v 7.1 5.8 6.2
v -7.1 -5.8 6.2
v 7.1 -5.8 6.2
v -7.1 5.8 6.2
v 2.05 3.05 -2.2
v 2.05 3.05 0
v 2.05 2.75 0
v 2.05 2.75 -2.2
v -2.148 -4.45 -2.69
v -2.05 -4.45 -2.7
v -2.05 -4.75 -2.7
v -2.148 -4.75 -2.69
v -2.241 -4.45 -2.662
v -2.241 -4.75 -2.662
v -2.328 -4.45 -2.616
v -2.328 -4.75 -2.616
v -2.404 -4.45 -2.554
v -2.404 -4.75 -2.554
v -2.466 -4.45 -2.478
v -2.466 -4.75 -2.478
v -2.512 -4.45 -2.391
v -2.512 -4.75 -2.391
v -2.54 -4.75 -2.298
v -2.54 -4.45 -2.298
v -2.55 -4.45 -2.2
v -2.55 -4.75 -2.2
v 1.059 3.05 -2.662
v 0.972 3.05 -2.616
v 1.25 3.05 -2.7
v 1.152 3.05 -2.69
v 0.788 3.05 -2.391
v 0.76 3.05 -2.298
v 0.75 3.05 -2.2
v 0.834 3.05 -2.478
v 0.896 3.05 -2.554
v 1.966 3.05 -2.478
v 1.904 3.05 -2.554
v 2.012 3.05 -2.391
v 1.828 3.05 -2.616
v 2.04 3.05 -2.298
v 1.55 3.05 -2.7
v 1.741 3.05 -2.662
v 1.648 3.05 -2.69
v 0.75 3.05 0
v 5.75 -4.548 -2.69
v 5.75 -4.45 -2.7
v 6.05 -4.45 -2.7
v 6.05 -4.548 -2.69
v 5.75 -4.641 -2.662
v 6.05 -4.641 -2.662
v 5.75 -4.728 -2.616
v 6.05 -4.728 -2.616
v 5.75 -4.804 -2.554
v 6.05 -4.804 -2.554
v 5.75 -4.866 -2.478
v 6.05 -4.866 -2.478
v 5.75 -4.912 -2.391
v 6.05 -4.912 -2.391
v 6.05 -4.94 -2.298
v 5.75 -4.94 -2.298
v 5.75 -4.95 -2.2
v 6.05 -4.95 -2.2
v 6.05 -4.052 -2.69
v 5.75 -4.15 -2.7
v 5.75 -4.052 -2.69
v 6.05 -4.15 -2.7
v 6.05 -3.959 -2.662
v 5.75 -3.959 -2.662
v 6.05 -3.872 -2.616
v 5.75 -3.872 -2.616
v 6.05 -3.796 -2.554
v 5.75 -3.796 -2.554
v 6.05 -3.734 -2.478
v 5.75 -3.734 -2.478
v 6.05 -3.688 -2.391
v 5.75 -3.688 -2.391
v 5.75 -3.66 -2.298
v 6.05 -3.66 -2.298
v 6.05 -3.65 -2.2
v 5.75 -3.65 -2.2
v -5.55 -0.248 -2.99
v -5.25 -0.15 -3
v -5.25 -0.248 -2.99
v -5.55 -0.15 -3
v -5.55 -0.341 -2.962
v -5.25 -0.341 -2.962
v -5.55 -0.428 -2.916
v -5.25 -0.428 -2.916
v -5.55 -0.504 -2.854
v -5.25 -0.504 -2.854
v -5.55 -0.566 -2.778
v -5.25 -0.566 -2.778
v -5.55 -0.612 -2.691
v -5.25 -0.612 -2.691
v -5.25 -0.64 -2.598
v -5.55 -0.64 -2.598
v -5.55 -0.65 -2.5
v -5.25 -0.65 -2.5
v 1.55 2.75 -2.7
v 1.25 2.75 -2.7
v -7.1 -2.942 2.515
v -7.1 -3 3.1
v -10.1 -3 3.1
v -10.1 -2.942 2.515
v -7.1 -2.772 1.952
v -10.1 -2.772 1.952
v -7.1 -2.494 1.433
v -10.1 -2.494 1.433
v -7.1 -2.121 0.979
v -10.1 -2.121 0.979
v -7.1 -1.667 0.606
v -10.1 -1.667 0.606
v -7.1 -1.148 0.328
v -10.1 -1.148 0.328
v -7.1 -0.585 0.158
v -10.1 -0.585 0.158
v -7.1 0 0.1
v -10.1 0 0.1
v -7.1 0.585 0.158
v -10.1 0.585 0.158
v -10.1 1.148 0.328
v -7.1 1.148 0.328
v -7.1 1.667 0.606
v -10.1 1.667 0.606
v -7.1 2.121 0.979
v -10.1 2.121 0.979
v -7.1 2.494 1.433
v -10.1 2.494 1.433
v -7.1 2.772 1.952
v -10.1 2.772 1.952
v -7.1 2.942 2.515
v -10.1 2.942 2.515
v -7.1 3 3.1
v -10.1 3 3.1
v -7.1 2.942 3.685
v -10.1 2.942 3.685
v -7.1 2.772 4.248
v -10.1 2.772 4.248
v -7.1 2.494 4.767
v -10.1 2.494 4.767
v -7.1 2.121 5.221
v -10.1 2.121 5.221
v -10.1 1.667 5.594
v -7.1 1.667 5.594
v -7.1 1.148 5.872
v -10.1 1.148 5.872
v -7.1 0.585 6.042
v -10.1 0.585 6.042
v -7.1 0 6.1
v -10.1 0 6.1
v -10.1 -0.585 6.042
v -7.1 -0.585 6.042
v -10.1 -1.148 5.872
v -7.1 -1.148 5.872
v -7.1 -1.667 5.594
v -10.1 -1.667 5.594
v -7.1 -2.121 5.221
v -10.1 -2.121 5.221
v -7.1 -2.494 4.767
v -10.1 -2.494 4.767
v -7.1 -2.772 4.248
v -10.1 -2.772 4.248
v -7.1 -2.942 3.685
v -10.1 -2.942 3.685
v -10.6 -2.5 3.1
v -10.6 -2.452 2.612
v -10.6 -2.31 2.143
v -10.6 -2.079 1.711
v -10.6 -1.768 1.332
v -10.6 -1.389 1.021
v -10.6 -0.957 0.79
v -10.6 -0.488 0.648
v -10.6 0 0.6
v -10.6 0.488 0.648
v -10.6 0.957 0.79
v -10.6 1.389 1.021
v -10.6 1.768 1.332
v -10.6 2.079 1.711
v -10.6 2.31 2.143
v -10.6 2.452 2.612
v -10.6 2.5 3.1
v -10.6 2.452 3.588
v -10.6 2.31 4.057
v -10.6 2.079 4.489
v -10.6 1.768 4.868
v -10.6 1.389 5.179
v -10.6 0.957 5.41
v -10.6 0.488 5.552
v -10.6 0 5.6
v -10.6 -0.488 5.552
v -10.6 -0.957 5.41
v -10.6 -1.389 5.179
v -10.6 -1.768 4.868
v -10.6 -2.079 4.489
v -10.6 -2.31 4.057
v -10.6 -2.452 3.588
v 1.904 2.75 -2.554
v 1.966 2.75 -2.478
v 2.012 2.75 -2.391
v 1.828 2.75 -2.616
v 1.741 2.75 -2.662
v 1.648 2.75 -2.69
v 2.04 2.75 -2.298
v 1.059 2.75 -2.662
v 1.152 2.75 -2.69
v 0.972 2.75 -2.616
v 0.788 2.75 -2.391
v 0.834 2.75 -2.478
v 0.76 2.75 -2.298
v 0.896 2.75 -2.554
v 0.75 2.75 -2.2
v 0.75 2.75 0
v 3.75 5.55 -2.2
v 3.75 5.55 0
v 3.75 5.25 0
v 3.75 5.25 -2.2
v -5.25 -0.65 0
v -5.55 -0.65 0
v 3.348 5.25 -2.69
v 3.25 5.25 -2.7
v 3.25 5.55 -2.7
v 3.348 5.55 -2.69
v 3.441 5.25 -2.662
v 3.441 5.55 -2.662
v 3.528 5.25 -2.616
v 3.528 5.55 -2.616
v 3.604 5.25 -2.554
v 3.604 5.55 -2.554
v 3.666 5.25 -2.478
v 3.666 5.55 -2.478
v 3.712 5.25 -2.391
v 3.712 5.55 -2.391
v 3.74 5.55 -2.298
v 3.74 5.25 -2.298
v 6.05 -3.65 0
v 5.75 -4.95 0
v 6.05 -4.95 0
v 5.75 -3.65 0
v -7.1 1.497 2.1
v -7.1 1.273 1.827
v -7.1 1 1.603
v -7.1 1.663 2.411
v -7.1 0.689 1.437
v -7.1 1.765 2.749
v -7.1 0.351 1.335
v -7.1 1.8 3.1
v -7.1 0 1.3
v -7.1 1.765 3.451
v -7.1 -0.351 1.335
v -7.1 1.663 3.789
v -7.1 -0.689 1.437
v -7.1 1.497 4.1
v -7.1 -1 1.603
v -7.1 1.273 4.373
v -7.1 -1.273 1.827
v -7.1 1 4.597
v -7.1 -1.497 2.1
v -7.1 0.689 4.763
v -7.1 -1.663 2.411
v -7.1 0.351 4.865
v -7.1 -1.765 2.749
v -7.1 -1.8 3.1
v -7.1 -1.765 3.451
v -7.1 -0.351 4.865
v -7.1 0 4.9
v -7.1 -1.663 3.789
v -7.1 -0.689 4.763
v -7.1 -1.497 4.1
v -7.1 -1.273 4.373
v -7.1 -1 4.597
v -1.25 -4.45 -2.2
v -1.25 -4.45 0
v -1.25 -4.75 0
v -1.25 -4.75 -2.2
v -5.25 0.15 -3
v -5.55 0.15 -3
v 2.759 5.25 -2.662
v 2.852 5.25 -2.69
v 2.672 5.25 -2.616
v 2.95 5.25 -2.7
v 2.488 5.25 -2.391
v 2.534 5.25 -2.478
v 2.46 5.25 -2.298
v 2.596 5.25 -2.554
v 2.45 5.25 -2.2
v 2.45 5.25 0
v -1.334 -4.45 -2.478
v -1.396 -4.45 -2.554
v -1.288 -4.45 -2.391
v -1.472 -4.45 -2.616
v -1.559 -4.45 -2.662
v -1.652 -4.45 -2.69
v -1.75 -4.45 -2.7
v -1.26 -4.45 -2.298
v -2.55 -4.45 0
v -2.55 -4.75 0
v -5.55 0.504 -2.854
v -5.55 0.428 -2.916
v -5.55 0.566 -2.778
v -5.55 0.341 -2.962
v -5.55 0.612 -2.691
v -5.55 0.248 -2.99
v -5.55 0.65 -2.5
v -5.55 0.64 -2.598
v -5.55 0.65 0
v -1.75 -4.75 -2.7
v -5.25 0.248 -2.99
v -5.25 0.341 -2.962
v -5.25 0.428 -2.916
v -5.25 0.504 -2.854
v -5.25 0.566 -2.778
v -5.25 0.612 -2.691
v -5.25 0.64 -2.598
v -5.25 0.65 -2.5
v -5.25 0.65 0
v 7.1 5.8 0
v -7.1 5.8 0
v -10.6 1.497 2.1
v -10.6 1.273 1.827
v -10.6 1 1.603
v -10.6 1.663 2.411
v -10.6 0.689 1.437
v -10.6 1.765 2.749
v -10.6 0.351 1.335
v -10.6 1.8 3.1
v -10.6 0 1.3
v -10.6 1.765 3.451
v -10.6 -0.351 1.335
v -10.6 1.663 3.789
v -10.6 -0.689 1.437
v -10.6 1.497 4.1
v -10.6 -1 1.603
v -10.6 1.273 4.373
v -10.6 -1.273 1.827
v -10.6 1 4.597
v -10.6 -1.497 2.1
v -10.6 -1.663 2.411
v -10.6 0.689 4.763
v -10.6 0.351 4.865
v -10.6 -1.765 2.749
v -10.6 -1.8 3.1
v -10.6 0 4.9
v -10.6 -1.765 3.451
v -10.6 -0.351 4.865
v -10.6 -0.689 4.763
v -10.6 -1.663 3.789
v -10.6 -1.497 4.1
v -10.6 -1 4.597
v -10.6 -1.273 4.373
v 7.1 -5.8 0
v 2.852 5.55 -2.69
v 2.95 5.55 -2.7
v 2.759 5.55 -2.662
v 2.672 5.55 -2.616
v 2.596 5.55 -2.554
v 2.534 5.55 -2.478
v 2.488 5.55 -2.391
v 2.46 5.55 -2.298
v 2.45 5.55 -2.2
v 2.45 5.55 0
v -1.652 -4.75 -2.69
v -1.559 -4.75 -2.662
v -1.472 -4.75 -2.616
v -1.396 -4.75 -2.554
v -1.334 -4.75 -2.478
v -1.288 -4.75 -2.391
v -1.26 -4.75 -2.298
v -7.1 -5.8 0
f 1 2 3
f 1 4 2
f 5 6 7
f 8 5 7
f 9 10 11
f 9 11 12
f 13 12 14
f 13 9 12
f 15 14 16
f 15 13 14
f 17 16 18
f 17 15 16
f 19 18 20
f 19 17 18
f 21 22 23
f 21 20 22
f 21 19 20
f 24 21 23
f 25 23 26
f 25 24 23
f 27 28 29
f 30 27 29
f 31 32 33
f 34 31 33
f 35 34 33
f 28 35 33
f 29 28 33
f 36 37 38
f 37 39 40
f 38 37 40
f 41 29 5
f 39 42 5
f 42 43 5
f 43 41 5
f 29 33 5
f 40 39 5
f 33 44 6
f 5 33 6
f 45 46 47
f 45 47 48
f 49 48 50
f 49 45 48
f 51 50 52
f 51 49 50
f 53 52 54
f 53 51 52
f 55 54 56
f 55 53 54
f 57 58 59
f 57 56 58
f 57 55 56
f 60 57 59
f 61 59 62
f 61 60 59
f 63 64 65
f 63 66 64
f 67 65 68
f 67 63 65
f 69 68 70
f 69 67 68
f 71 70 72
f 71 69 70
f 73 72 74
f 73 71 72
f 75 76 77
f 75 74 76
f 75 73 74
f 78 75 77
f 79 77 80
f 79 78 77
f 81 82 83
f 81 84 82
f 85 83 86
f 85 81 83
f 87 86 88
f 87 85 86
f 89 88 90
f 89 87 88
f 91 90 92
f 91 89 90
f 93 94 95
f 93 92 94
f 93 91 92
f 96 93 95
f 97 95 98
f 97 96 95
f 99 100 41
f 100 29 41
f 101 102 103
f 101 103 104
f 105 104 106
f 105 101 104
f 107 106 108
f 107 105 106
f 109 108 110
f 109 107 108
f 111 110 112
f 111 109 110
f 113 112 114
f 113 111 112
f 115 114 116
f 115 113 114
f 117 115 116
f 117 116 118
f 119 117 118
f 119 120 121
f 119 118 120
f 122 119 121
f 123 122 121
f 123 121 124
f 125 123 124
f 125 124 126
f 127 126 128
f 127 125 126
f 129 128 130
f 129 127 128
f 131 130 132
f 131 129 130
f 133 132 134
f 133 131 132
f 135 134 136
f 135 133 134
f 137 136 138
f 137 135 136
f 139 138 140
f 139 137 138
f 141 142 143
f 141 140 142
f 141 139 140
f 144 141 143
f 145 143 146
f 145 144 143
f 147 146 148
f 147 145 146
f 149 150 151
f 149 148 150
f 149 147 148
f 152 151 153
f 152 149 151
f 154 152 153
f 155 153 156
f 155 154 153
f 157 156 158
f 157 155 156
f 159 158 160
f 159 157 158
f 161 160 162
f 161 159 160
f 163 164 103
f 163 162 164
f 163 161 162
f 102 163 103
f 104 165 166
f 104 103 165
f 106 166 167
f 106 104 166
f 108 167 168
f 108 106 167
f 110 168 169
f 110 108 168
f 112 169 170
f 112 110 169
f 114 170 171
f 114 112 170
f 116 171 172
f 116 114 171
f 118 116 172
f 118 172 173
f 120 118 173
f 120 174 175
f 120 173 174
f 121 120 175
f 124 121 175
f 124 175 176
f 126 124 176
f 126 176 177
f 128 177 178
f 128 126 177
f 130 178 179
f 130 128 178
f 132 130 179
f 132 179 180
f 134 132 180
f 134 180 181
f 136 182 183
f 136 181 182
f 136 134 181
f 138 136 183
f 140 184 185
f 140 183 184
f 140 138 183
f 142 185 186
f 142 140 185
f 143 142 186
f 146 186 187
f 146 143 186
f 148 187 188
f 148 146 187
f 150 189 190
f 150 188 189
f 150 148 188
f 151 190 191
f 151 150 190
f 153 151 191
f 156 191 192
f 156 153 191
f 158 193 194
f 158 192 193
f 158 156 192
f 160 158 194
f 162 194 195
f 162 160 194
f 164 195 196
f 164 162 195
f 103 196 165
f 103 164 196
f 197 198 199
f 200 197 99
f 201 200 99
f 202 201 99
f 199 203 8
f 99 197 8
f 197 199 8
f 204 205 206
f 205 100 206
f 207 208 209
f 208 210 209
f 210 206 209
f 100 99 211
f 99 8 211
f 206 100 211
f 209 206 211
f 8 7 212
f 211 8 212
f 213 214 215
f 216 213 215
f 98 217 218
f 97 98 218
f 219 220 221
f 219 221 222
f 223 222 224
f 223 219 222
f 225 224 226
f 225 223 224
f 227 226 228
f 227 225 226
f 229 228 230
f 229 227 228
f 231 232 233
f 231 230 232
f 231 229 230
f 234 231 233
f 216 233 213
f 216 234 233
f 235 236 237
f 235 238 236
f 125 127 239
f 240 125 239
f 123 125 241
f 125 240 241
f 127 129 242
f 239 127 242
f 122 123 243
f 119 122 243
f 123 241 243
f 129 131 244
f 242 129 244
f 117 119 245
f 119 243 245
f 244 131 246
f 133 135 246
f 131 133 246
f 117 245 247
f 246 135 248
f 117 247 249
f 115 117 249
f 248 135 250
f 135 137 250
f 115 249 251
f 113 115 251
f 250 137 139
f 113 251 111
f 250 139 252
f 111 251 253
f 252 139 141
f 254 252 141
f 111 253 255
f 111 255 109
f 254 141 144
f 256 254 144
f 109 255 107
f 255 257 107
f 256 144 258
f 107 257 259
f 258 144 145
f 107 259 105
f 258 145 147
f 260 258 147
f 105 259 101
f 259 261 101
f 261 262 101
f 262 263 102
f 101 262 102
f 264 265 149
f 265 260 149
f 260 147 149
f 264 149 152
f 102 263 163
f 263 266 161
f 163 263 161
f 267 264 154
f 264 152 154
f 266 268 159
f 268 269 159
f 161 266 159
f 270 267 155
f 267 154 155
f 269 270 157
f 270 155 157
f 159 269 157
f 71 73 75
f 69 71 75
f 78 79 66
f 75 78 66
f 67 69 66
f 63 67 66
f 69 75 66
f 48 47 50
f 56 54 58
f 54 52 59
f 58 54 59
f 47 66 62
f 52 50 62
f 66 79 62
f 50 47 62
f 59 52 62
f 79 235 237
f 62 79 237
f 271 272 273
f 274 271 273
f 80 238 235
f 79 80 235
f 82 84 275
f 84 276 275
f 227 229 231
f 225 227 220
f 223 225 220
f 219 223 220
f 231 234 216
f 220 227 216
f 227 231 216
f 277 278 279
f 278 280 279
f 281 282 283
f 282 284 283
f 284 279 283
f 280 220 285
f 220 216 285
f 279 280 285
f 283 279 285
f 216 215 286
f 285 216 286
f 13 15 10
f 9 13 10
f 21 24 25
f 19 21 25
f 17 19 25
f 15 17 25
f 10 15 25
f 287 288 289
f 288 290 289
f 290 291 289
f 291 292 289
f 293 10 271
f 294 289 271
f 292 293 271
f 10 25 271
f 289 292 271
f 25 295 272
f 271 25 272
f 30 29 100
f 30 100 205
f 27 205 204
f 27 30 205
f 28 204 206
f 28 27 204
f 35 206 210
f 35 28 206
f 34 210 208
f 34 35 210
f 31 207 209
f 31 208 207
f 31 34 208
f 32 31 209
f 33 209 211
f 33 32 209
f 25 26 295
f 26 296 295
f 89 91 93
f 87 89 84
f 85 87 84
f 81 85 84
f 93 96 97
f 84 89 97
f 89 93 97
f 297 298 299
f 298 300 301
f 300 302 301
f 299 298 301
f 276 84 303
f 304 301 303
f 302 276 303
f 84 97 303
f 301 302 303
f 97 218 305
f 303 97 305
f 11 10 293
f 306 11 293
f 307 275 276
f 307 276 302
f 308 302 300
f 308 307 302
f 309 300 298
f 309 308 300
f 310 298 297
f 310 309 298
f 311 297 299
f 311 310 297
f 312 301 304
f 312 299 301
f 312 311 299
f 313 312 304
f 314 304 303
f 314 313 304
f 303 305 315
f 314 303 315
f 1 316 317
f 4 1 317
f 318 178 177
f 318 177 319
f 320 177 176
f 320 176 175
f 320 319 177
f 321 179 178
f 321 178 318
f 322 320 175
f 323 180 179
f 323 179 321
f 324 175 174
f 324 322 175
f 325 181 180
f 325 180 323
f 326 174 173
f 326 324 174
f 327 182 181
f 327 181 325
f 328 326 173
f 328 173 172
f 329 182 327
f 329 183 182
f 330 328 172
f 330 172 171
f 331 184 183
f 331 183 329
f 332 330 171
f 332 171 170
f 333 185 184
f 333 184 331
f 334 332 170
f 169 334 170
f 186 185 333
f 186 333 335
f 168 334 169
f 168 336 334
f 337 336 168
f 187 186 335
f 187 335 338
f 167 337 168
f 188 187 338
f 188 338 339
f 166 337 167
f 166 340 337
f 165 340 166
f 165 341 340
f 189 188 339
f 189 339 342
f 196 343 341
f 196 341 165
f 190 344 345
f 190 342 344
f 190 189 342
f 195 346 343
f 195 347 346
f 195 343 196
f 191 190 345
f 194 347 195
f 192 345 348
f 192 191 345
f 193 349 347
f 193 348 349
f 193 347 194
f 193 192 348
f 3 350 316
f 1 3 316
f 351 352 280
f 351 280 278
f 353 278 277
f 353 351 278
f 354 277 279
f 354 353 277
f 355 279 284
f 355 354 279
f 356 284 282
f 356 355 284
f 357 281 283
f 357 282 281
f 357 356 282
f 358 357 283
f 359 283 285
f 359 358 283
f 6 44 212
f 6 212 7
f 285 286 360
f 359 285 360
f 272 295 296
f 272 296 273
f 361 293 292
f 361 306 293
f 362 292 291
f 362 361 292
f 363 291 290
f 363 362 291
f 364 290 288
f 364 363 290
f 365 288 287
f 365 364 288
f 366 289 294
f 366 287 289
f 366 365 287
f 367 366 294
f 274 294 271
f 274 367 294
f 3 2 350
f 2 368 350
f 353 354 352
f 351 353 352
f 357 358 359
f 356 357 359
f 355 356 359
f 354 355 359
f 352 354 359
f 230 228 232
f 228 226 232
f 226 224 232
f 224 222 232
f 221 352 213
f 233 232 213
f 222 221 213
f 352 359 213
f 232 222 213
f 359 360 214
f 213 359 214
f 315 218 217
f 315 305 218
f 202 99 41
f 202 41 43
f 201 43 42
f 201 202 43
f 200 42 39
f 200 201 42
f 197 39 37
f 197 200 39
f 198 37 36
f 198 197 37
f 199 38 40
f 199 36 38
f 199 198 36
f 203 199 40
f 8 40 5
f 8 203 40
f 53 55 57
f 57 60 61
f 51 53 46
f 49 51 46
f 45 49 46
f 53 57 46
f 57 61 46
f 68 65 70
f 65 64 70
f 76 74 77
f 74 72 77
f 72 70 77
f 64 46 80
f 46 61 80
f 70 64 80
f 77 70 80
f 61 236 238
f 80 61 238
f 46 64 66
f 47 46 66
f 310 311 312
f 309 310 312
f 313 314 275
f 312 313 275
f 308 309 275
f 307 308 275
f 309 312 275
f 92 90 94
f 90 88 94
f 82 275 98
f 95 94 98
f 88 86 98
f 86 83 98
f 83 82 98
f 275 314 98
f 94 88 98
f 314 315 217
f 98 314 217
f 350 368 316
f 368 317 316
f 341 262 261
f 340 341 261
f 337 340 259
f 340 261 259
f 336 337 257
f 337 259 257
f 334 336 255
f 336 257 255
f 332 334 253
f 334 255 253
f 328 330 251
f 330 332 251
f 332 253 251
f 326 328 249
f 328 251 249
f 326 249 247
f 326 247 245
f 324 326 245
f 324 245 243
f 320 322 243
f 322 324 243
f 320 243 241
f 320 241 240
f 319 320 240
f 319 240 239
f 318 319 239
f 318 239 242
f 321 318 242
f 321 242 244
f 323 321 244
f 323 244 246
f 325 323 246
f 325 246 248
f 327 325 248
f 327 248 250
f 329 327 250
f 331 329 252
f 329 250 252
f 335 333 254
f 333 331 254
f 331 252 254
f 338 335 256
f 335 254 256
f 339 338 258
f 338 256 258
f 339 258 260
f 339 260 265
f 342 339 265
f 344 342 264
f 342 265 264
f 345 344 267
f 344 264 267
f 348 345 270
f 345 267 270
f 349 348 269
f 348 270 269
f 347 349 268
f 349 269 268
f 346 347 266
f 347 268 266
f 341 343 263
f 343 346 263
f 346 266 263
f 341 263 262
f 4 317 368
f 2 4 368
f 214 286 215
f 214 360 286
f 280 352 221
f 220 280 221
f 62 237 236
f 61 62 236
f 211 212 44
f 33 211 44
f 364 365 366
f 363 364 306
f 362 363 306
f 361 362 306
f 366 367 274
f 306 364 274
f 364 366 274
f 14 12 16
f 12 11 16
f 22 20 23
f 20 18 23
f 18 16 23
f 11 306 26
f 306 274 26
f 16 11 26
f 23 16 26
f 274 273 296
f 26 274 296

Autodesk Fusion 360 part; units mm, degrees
sketch "スケッチ1" plane through (0, 0, 0) normal (0, 0, 1) x (1, 0, 0)
  line L0 (2.2, 4.9) -> (4, 4.9)
  line L1 (5.9, -3.4) -> (5.9, -5.2) construction
  line L2 (-1, -5.1) -> (-1, -4.1)
  line L3 (6.4, -3.4) -> (5.4, -3.4)
  line L4 (5.4, -5.2) -> (6.4, -5.2)
  line L5 (6.4, -5.2) -> (6.4, -3.4)
  line L6 (5.4, -3.4) -> (5.4, -5.2)
  line L7 (2.2, 5.4) -> (4, 5.4) construction
  line L8 (0.5, 2.9) -> (2.3, 2.9) construction
  line L9 (0.5, 3.4) -> (0.5, 2.4)
  line L10 (2.3, 3.4) -> (0.5, 3.4)
  line L11 (0.5, 2.4) -> (2.3, 2.4)
  line L12 (-7.1, -5.8) -> (7.1, 5.8) construction
  line L13 (7.1, -5.8) -> (7.1, 5.8)
  line L14 (4, 5.9) -> (2.2, 5.9)
  line L15 (-5.9, -0.9) -> (-4.9, -0.9)
  line L16 (-10.6, -3) -> (-10.6, 3)
  line L17 (-10.6, 3) -> (-7.1, 3)
  line L18 (-2.8, -5.1) -> (-1, -5.1)
  line L19 (-7.1, -3) -> (-10.6, -3)
  line L20 (-4.9, 0.9) -> (-5.9, 0.9)
  line L21 (-5.9, 0.9) -> (-5.9, -0.9)
  line L22 (-4.9, -0.9) -> (-4.9, 0.9)
  line L23 (-7.1, -5.8) -> (7.1, -5.8)
  line L24 (-2.8, -4.1) -> (-2.8, -5.1)
  line L25 (-7.1, 5.8) -> (-7.1, -5.8)
  line L26 (-5.4, 0.9) -> (-5.4, -0.9) construction
  line L27 (-2.8, -4.6) -> (-1, -4.6) construction
  line L28 (7.1, 5.8) -> (-7.1, 5.8)
  line L29 (2.2, 5.9) -> (2.2, 4.9)
  line L30 (2.3, 2.4) -> (2.3, 3.4)
  line L31 (4, 4.9) -> (4, 5.9)
  line L32 (-1, -4.1) -> (-2.8, -4.1)
  line L33 (-10.6, 0) -> (7.1, 0) construction
  point P0 (1.4, 2.9)
  point P1 (5.9, -4.3)
  point P2 (3.1, 5.4)
  point P3 (-1.9, -4.6)
  point P4 (-5.4, 0)
  dimension "d58" = 1.8
  dimension "d59" = 1
  dimension "d60" = 1.8
  dimension "d61" = 1
  dimension "d62" = 1.8
  dimension "d63" = 1
  dimension "d64" = 1.8
  dimension "d65" = 1
  dimension "d66" = 1
  dimension "d67" = 1.8
  dimension "d68" = 3.5
  dimension "d69" = 6
  dimension "d71" = 8.5
  dimension "d72" = 10.2
  dimension "d73" = 5.4
  dimension "d74" = 4.3
  dimension "d75" = 4.6
  dimension "d76" = 13
  dimension "d77" = 5.2
  dimension "d78" = 2.9
  dimension "d79" = 14.2
  dimension "d80" = 11.6
  dimension "d81" = 1.7
sketch "スケッチ3" plane through (0, 0, 0) normal (0, 0, 1) x (1, 0, 0)
  line L0 (0.75, 3.05) -> (2.05, 3.05)
  line L1 (2.05, 3.05) -> (2.05, 2.75)
  line L2 (2.05, 2.75) -> (0.75, 2.75)
  line L3 (0.75, 2.75) -> (0.75, 3.05)
  line L4 (0.75, 3.05) -> (2.05, 2.75) construction
  line L5 (-1.25, -4.45) -> (-1.25, -4.75)
  line L6 (-2.55, -4.75) -> (-2.55, -4.45)
  line L7 (-2.55, -4.45) -> (-1.25, -4.45)
  line L8 (-1.25, -4.75) -> (-2.55, -4.75)
  line L9 (-2.55, -4.45) -> (-1.25, -4.75) construction
  line L10 (3.75, 5.55) -> (3.75, 5.25)
  line L11 (2.45, 5.25) -> (2.45, 5.55)
  line L12 (2.45, 5.55) -> (3.75, 5.55)
  line L13 (3.75, 5.25) -> (2.45, 5.25)
  line L14 (2.45, 5.55) -> (3.75, 5.25) construction
  line L15 (-5.55, 0.65) -> (-5.25, 0.65)
  line L16 (-5.25, -0.65) -> (-5.55, -0.65)
  line L17 (-5.55, -0.65) -> (-5.55, 0.65)
  line L18 (-5.25, 0.65) -> (-5.25, -0.65)
  line L19 (-5.55, -0.65) -> (-5.25, 0.65) construction
  line L20 (5.75, -3.65) -> (6.05, -3.65)
  line L21 (6.05, -4.95) -> (5.75, -4.95)
  line L22 (5.75, -4.95) -> (5.75, -3.65)
  line L23 (6.05, -3.65) -> (6.05, -4.95)
  line L24 (5.75, -4.95) -> (6.05, -3.65) construction
  point P0 (1.4, 2.9)
  point P1 (-1.9, -4.6)
  point P2 (3.1, 5.4)
  point P3 (-5.4, 0)
  point P4 (5.9, -4.3)
  point P5 (-1.9, -4.6)
  point P6 (1.4, 2.9)
  point P7 (3.1, 5.4)
  point P8 (5.9, -4.3)
  point P9 (-5.4, 0)
  dimension "d36" = 1.3
  dimension "d37" = 0.3
  dimension "d38" = 1.3
  dimension "d39" = 0.3
  dimension "d40" = 1.3
  dimension "d41" = 0.3
  dimension "d46" = 1.3
  dimension "d47" = 0.3
  dimension "d50" = 1.3
  dimension "d51" = 0.3
extrude "押し出し1" add sketch "スケッチ1" along normal blind 6.2 contours L0 L28 L29 L31 | L0 L13 L23 L25 L28 L29 L31 | L2 L18 L24 L32 | L3 L4 L5 L6 | L9 L10 L11 L30 | L15 L20 L21 L22 makes body 1
sketch "スケッチ2" plane through (-7.1, 0, 0) normal (-1, 0, 0) x (0, -1, 0)
  circle A0 centre (0, 3.1) radius 3
  line L0 (-5.8, 3.1) -> (5.8, 3.1) construction
  circle A1 centre (0, 3.1) radius 1.8
  line L1 (-5.8, 0) -> (5.8, 0)
  line L2 (5.8, 0) -> (5.8, 6.2)
  line L3 (5.8, 6.2) -> (-5.8, 6.2)
  line L4 (-5.8, 6.2) -> (-5.8, 0)
  line L5 (-5.8, 0) -> (5.8, 0)
  line L6 (5.8, 0) -> (5.8, 6.2)
  line L7 (5.8, 6.2) -> (-5.8, 6.2)
  line L8 (-5.8, 6.2) -> (-5.8, 0)
  dimension "d31" = 6
  dimension "d34" = 3.6
extrude "押し出し2" add sketch "スケッチ2" along normal blind 3.5 separate body contours A0 makes body 2
extrude "押し出し3" add sketch "スケッチ3" against normal blind 2.7 separate body contours L0 L1 L2 L3 | L5 L6 L7 L8 | L10 L11 L12 L13 | L20 L21 L22 L23 makes body 3 at (1.1833, 3.05, -0.9) makes body 4 at (3.3167, 5.25, -0.9) makes body 5 at (6.05, -4.0833, -0.9) makes body 6 at (-1.6833, -4.75, -0.9)
extrude "押し出し4" add sketch "スケッチ3" against normal blind 3 separate body contours L15 L16 L17 L18 makes body 7
chamfer "面取り1" distance 0.5 angle 45 1 edges at (-10.6, 2.797, 2.0152) on bodies 2
fillet "フィレット1" radius 0.5 10 edges at (2.05, 2.9, -2.7) (0.75, 2.9, -2.7) (3.75, 5.4, -2.7) (2.45, 5.4, -2.7) (5.9, -4.95, -2.7) (5.9, -3.65, -2.7) (-2.55, -4.6, -2.7) (-1.25, -4.6, -2.7) (-5.4, -0.65, -3) (-5.4, 0.65, -3) on bodies 3 4 5 6 7
